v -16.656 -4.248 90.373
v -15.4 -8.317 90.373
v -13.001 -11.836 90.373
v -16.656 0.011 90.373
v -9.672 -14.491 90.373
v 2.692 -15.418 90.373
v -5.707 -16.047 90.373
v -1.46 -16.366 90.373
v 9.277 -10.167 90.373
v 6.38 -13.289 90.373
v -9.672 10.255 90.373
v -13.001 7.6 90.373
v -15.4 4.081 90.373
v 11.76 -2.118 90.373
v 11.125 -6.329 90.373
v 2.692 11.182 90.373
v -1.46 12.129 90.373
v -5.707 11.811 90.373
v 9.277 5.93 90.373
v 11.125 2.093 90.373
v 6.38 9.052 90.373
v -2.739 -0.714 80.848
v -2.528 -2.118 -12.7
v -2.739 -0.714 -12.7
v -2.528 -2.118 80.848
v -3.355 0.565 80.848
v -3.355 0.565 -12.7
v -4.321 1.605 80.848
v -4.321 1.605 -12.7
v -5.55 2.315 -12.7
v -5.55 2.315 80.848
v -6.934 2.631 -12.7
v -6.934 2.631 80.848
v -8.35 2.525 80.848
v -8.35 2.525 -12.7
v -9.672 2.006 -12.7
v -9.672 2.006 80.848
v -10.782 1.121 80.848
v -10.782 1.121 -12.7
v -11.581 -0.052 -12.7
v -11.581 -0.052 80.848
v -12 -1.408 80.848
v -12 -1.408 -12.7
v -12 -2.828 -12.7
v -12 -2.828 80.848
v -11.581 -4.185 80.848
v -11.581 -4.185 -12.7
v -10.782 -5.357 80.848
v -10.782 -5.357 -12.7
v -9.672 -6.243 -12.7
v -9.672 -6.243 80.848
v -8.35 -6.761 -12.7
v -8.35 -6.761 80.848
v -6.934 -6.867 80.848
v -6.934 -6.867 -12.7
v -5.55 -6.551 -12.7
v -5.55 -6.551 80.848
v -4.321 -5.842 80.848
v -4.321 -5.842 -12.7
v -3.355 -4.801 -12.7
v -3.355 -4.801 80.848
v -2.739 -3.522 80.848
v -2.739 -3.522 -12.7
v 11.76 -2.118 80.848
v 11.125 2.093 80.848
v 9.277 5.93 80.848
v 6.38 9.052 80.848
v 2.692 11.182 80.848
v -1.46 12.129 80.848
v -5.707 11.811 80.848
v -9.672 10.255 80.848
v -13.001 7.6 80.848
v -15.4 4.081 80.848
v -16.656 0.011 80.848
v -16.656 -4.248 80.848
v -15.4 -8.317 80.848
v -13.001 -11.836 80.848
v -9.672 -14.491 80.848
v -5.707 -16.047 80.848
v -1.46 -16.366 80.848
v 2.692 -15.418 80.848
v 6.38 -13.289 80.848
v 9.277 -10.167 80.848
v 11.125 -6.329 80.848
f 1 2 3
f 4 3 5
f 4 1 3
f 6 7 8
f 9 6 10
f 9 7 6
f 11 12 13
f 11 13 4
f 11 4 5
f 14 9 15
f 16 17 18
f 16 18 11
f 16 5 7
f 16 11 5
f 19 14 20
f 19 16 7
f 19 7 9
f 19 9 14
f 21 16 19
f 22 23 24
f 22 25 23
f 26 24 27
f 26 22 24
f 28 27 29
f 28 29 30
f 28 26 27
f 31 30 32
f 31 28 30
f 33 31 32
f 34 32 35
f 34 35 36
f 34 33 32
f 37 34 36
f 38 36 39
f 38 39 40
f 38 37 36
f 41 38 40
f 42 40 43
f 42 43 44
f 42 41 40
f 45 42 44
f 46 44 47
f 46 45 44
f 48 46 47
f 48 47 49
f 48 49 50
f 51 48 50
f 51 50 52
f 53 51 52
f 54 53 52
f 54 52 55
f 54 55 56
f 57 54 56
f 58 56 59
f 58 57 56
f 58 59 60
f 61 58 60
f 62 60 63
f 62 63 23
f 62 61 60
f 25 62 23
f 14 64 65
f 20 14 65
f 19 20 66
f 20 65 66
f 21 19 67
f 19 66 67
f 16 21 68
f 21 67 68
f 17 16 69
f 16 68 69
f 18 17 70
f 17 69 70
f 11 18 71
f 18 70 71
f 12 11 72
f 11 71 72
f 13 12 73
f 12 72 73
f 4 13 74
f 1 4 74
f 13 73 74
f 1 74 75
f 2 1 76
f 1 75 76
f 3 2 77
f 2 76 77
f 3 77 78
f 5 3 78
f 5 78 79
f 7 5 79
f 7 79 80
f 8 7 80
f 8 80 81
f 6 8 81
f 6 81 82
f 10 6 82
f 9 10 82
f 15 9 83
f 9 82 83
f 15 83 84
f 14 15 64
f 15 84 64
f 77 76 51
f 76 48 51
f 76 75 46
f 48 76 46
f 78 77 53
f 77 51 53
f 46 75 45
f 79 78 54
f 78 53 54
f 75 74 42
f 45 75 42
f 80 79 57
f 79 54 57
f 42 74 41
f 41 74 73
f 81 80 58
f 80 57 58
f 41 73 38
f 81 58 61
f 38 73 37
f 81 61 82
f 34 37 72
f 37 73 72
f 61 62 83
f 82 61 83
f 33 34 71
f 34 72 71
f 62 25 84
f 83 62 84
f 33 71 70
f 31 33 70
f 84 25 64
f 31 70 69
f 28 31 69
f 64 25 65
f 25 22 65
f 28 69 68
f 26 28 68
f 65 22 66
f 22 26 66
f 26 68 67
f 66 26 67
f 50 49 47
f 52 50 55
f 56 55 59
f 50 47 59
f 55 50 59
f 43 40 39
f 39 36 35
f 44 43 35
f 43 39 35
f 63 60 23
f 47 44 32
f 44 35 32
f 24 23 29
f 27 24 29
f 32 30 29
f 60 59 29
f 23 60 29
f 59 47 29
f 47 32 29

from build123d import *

# Parameters (mm, degrees)
F0_R     = 4.7625
F1_DEPTH = 80.8482
F2_R     = 14.2875
F3_DEPTH = 9.525
F4_DEPTH = 12.7


with BuildPart() as f1:
    # F0 (on Top) → F1 (new body)
    with BuildSketch(Plane.XY):
        with Locations((-7.290369, -2.118148)):
            Circle(F0_R)
    extrude(amount=F1_DEPTH)

    # F2 (on face) → F3 (join)
    with BuildSketch(Plane.XY.offset(80.8482)):
        with Locations((-2.527869, -2.118148)):
            Circle(F2_R)
    extrude(amount=F3_DEPTH)

    # F0 (on Top) → F4 (join)
    with BuildSketch(Plane.XY):
        with Locations((-7.290369, -2.118148)):
            Circle(F0_R)
    extrude(amount=-F4_DEPTH)


solid = f1.part
